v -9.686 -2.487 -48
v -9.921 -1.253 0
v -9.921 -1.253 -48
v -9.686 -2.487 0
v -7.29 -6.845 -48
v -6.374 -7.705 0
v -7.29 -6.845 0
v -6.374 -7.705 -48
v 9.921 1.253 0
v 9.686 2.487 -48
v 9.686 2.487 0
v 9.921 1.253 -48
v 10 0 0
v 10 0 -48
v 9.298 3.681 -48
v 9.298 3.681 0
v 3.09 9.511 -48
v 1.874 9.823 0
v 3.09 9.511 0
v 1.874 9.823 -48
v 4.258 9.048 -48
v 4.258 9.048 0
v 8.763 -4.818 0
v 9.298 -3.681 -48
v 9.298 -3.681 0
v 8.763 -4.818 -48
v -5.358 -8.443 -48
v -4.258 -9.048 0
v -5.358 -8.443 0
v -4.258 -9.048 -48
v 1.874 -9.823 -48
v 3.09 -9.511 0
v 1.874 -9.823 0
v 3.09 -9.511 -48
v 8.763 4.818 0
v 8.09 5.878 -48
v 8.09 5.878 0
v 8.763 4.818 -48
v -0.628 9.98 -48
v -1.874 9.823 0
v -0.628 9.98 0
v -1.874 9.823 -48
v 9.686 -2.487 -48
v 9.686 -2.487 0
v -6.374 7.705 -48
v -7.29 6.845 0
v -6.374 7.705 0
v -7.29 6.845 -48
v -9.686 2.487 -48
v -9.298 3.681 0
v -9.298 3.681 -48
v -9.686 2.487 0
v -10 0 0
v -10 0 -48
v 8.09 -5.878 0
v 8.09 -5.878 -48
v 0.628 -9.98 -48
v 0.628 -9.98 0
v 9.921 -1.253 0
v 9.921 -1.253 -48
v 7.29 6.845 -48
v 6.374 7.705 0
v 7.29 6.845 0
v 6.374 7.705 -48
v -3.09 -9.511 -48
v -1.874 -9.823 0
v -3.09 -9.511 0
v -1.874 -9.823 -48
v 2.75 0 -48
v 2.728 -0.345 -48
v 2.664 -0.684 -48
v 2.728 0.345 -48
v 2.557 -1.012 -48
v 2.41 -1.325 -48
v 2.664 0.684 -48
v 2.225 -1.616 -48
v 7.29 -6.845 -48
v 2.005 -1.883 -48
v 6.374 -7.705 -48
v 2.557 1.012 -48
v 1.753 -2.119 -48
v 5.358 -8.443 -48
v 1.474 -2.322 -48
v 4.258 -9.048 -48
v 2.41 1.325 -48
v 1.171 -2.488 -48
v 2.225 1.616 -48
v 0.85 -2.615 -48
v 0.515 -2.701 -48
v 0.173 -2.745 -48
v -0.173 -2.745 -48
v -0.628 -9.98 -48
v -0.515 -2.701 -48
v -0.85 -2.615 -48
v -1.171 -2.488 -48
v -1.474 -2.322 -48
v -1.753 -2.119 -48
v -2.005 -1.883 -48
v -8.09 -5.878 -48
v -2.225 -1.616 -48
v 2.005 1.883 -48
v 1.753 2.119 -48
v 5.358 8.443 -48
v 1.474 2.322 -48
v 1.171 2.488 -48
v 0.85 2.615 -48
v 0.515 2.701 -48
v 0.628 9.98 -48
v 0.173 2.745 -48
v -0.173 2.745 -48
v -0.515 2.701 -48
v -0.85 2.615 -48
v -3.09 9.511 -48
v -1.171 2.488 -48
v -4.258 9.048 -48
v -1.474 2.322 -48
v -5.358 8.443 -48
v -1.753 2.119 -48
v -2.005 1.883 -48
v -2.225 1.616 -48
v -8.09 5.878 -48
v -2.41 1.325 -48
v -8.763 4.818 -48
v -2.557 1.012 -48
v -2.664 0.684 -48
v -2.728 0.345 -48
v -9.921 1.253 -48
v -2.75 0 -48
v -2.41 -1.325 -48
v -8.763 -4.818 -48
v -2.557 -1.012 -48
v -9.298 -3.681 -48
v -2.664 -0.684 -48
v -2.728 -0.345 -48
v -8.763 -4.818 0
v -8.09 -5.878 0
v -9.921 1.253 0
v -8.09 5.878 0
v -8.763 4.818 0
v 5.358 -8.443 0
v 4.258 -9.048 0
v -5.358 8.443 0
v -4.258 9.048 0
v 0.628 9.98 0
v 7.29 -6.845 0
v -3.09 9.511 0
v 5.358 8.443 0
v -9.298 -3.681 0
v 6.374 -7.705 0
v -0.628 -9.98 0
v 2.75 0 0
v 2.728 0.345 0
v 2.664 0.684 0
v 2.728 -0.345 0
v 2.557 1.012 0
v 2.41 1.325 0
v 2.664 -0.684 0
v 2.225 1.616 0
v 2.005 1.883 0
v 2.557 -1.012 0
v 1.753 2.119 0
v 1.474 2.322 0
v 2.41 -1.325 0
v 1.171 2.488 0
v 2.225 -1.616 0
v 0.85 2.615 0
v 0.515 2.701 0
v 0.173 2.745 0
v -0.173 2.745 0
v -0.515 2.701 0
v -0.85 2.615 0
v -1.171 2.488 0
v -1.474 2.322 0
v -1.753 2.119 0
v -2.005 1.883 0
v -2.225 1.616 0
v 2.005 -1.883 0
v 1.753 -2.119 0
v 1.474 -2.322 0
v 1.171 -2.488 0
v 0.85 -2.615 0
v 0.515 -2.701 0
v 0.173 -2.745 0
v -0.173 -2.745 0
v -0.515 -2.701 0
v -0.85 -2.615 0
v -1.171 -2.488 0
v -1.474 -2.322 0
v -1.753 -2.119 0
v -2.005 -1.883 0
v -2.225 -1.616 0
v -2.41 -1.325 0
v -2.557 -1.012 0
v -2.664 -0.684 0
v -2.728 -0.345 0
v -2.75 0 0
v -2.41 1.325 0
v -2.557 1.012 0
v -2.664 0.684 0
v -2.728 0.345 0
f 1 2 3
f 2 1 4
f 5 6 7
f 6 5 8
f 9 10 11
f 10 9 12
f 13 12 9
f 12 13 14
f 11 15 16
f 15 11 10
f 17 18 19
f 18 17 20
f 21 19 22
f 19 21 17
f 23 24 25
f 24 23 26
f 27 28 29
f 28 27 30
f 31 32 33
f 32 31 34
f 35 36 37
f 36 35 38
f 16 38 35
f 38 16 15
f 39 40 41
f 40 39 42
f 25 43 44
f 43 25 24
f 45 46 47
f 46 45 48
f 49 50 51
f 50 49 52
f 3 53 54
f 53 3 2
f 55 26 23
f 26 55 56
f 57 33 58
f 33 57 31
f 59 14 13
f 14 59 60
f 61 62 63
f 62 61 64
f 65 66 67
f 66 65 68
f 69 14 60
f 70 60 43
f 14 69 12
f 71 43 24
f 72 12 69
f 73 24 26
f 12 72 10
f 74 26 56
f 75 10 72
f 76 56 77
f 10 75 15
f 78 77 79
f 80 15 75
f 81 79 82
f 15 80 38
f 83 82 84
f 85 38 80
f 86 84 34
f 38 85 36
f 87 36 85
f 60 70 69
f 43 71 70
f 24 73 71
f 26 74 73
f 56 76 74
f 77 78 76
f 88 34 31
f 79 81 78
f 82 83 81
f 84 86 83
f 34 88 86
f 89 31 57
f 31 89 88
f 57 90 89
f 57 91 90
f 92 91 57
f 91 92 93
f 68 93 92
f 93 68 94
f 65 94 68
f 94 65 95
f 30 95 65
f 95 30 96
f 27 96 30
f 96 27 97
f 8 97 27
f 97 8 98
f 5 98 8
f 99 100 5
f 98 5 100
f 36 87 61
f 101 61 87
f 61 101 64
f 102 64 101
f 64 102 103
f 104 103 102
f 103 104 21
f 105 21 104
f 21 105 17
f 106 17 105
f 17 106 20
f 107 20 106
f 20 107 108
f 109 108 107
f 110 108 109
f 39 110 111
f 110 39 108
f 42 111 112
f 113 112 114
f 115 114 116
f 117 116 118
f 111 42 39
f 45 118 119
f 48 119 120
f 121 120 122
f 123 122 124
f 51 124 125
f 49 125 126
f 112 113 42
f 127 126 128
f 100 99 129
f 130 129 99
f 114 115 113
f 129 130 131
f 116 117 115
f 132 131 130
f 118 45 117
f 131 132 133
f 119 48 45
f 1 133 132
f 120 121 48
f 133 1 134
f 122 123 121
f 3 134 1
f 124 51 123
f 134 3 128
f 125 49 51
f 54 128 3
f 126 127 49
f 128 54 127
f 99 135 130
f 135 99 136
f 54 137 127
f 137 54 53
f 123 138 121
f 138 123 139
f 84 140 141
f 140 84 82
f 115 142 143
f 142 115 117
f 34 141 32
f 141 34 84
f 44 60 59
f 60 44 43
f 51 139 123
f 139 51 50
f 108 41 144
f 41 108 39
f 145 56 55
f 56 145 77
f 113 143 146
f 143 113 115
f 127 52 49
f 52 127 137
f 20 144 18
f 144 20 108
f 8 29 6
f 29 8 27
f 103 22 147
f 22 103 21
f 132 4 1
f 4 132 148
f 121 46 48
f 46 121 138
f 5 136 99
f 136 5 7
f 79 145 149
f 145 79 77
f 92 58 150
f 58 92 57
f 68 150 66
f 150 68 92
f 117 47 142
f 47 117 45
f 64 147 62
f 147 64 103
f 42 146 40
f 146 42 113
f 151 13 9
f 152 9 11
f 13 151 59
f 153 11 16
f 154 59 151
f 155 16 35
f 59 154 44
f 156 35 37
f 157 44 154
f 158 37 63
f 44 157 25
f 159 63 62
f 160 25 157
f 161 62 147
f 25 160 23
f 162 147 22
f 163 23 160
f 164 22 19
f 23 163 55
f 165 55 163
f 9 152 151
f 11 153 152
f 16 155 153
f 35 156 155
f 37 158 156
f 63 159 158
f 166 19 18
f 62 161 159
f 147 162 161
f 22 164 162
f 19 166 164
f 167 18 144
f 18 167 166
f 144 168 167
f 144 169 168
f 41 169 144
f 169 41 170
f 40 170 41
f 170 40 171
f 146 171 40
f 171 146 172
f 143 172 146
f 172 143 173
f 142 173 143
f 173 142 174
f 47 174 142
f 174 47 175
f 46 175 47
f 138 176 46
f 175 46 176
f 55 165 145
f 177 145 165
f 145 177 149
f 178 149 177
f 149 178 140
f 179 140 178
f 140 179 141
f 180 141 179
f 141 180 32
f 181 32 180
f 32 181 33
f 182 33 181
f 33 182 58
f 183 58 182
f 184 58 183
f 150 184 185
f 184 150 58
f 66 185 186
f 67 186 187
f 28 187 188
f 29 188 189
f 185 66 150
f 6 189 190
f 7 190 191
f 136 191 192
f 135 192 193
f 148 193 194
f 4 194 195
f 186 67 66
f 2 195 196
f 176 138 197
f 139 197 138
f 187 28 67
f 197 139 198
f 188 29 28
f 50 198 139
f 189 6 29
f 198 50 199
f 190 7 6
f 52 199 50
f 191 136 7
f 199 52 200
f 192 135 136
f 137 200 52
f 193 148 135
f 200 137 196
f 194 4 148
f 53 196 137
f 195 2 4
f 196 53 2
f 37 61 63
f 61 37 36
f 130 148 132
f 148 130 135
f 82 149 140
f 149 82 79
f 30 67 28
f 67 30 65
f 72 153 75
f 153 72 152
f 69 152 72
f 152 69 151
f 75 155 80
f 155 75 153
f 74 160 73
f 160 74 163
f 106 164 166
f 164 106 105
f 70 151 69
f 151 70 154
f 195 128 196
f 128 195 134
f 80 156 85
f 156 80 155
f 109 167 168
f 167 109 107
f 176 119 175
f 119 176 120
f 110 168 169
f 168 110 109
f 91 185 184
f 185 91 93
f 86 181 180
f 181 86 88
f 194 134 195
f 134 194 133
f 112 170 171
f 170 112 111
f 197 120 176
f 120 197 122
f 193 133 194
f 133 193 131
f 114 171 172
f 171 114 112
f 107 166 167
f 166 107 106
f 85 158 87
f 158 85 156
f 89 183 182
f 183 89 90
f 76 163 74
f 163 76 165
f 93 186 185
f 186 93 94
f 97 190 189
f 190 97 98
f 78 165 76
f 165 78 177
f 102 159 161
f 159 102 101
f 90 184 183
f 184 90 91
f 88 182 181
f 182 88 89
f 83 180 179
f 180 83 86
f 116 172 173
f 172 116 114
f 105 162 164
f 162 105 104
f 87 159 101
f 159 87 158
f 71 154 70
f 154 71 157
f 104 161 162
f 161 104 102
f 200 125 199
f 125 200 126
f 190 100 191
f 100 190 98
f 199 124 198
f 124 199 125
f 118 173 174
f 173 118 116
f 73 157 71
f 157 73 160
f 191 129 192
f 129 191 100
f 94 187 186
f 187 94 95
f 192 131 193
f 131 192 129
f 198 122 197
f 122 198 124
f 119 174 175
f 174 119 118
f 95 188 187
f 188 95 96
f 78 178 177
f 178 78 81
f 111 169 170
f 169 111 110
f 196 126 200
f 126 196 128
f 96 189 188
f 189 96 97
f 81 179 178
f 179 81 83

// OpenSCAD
$fn = 50;


difference() {
	union() {
		translate(v = [0, 0, -48.0000000000]) {
			cylinder(h = 48, r = 10.0000000000);
		}
		cylinder(h = 0, r = 16.0000000000);
	}
	union() {
		#translate(v = [0, 0, -48]) {
			cylinder(h = 48, r = 2.7500000000);
		}
	}
}
